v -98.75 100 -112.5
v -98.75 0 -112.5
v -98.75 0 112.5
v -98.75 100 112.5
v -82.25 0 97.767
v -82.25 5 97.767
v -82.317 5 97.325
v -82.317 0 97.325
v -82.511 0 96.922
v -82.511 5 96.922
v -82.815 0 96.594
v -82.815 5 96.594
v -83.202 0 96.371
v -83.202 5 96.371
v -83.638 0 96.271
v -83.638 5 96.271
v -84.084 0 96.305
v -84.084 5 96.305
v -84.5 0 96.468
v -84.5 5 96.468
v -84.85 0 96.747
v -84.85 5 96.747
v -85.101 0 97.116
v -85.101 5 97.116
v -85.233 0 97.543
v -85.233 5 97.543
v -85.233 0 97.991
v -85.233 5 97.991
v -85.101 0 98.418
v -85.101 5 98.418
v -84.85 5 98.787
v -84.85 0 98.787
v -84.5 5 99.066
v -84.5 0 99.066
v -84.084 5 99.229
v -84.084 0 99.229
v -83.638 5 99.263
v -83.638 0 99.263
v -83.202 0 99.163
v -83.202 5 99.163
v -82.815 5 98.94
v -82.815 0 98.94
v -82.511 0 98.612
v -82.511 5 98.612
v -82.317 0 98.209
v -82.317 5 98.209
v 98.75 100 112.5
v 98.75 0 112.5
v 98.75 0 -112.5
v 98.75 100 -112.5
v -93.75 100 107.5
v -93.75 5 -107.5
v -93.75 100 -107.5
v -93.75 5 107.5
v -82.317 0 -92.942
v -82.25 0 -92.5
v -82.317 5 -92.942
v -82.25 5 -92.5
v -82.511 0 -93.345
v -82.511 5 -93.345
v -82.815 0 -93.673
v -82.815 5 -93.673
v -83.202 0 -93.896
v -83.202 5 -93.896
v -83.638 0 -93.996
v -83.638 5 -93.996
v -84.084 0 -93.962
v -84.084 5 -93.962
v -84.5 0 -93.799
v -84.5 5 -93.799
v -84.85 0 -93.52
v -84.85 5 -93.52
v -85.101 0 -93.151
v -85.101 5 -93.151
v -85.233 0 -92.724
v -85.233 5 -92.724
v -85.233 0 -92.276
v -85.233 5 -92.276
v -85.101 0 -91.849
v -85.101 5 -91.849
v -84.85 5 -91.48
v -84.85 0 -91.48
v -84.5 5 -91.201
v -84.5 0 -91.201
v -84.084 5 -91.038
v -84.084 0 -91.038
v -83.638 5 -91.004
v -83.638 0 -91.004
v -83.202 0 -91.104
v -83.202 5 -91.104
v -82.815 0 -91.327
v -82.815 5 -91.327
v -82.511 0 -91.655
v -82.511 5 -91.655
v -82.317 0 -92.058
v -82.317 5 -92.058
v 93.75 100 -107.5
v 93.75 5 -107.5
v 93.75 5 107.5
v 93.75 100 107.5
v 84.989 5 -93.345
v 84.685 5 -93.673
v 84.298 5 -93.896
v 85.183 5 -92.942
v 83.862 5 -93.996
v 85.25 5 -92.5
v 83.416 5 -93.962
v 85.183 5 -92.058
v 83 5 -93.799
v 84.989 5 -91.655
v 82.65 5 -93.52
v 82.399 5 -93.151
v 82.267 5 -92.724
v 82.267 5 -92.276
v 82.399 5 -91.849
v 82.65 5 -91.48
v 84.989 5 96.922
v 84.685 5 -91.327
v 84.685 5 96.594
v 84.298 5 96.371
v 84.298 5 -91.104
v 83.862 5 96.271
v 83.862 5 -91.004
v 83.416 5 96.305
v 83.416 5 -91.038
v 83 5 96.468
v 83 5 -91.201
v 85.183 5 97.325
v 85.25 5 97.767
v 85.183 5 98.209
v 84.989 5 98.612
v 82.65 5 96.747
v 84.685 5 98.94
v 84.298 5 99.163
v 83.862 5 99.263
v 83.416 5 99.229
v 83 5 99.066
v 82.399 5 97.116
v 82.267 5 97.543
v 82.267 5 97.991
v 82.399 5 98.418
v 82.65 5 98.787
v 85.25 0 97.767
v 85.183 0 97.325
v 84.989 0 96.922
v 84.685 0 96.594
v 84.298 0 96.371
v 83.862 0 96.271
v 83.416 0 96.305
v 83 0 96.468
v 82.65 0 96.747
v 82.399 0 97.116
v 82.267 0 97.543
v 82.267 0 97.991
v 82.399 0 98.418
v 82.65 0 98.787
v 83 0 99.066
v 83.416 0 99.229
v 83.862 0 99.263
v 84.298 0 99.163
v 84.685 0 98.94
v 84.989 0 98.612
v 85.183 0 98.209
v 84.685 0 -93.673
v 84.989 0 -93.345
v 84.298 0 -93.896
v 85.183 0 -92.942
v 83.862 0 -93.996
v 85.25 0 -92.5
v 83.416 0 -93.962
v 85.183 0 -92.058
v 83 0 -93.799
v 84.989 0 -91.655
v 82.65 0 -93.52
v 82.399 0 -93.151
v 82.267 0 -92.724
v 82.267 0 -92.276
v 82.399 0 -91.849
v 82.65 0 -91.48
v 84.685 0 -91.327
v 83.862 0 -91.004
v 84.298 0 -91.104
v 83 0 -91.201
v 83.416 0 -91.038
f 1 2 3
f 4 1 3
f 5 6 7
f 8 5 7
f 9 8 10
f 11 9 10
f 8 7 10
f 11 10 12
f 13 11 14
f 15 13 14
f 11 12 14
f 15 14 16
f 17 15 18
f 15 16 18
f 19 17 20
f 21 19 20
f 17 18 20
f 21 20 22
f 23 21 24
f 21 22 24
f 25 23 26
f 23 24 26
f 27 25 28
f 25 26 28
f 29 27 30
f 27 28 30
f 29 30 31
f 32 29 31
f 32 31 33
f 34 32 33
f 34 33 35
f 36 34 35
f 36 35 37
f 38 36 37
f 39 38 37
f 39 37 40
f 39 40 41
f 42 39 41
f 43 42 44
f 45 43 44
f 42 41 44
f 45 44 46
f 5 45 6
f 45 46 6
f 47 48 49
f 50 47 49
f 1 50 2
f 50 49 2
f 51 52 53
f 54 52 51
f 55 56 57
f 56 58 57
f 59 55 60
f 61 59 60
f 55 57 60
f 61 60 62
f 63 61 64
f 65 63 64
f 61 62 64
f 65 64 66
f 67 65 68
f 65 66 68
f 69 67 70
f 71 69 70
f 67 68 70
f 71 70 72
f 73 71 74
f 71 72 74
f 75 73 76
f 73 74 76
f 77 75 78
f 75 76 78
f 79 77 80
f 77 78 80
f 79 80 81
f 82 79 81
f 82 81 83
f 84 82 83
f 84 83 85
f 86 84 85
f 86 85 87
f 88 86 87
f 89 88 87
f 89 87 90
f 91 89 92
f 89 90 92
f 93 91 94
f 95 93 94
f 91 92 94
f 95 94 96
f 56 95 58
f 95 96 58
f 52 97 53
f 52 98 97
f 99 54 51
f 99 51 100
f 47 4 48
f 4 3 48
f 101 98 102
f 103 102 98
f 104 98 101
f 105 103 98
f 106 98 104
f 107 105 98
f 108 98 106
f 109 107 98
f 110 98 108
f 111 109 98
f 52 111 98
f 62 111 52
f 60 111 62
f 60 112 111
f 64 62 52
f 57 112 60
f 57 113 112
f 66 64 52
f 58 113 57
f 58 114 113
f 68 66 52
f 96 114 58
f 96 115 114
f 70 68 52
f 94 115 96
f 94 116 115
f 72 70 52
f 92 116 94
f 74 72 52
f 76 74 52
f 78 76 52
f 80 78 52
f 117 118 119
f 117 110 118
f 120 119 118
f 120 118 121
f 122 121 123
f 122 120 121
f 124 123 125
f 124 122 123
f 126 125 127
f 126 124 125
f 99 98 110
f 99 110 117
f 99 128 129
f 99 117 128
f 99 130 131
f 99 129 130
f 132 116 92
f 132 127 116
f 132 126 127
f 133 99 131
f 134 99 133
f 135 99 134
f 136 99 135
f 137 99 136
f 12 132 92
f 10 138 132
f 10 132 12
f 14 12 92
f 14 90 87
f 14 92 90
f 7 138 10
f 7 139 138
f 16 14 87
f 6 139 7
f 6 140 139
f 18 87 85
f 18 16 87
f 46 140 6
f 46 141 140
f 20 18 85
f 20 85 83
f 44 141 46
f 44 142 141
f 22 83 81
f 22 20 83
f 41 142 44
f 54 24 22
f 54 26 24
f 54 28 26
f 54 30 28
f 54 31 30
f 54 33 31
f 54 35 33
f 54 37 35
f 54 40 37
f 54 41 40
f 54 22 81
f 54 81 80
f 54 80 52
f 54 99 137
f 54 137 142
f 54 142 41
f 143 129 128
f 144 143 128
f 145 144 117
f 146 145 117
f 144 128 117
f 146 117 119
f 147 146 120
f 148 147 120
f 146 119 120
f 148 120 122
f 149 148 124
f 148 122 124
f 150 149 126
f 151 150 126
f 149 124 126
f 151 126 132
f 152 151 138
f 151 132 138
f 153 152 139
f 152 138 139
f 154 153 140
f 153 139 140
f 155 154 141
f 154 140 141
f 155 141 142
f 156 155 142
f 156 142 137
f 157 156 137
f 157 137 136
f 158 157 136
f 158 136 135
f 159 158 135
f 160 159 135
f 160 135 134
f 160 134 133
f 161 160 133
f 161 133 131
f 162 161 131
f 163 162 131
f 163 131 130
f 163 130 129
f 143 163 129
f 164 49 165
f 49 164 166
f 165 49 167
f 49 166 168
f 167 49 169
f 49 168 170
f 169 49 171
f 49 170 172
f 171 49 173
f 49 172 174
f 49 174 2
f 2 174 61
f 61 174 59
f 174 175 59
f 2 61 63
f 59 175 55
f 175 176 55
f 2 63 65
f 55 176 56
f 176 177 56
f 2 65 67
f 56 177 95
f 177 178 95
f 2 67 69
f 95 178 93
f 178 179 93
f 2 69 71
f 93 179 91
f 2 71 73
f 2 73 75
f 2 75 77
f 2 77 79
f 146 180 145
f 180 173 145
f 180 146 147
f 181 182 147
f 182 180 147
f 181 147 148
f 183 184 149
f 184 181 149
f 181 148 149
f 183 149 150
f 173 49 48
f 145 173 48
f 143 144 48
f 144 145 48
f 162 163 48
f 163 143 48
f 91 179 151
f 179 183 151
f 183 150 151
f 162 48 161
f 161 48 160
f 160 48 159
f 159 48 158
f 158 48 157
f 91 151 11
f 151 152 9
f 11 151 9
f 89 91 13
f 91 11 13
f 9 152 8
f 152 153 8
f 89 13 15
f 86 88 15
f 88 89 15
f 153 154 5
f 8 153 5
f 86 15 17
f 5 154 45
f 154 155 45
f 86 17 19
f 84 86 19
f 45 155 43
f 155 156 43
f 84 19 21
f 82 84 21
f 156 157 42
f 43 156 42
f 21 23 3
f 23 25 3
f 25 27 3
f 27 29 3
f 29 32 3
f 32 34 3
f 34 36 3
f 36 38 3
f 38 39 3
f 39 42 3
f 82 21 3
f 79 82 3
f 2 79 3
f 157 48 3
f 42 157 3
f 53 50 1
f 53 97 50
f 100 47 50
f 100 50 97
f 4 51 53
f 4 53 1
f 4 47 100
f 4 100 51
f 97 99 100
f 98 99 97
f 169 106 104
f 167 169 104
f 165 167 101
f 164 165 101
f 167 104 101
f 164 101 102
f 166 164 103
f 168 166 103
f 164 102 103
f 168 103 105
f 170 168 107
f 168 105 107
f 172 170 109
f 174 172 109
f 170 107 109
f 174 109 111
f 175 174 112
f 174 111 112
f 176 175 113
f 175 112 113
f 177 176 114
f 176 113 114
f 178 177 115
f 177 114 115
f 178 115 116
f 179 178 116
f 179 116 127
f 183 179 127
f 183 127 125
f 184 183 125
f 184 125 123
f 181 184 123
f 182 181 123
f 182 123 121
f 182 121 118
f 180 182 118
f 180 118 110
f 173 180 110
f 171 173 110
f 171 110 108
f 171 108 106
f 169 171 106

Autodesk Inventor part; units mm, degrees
ref_plane "YZ Plane" through (0, 0, 0) normal (1, 0, 0) x (0, 1, 0)
ref_plane "XZ Plane" through (0, 0, 0) normal (0, 1, 0) x (-1, 0, 0)
ref_plane "XY Plane" through (0, 0, 0) normal (0, 0, 1) x (1, 0, 0)
sketch "Sketch1" plane through (0, 0, 0) normal (0, 1, 0) x (-1, 0, 0)
  line L0 (98.75, 112.5) -> (-98.75, 112.5)
  line L1 (-98.75, 112.5) -> (-98.75, -112.5)
  line L2 (-98.75, -112.5) -> (98.75, -112.5)
  line L3 (98.75, -112.5) -> (98.75, 112.5)
  line L4 (98.75, 112.5) -> (-98.75, -112.5) construction
  line L5 (-98.75, 112.5) -> (98.75, -112.5) construction
  point P0 (0, 0)
  dimension "d0" = 197.5
  dimension "d1" = 225
extrude "Extrusion1" add sketch "Sketch1" along normal blind 100
shell "Shell1" thickness 5 removed faces 1 at (32.9167, 100, 37.5)
sketch "Sketch2" plane through (-93.75, 5, -107.5) normal (0, 1, 0) x (1, 0, 0)
  circle A0 centre (10, -15) radius 1.5
  line L0 (187.5, -215) -> (0, -215) projected
  line L1 (93.75, -215) -> (93.75, 0)
  line L2 (0, 0) -> (187.5, 0) projected
  line L3 (187.5, -215) -> (187.5, 0) projected
  line L4 (0, -215) -> (0, 0) projected
  line L5 (192.5, 5) -> (-5, 5) projected
  circle A1 centre (10, -205.267) radius 1.5
  circle A2 centre (177.5, -15) radius 1.5
  circle A3 centre (177.5, -205.267) radius 1.5
  point P0 (93.75, -107.5)
  dimension "d5" = 3
  dimension "d6" = 20
  dimension "d7" = 3
  dimension "d8" = 190.267
  dimension "d9" = 10
extrude "Extrusion2" cut sketch "Sketch2" against normal through all contours A0 | A1 | A2 | A3
properties part number "Box"
